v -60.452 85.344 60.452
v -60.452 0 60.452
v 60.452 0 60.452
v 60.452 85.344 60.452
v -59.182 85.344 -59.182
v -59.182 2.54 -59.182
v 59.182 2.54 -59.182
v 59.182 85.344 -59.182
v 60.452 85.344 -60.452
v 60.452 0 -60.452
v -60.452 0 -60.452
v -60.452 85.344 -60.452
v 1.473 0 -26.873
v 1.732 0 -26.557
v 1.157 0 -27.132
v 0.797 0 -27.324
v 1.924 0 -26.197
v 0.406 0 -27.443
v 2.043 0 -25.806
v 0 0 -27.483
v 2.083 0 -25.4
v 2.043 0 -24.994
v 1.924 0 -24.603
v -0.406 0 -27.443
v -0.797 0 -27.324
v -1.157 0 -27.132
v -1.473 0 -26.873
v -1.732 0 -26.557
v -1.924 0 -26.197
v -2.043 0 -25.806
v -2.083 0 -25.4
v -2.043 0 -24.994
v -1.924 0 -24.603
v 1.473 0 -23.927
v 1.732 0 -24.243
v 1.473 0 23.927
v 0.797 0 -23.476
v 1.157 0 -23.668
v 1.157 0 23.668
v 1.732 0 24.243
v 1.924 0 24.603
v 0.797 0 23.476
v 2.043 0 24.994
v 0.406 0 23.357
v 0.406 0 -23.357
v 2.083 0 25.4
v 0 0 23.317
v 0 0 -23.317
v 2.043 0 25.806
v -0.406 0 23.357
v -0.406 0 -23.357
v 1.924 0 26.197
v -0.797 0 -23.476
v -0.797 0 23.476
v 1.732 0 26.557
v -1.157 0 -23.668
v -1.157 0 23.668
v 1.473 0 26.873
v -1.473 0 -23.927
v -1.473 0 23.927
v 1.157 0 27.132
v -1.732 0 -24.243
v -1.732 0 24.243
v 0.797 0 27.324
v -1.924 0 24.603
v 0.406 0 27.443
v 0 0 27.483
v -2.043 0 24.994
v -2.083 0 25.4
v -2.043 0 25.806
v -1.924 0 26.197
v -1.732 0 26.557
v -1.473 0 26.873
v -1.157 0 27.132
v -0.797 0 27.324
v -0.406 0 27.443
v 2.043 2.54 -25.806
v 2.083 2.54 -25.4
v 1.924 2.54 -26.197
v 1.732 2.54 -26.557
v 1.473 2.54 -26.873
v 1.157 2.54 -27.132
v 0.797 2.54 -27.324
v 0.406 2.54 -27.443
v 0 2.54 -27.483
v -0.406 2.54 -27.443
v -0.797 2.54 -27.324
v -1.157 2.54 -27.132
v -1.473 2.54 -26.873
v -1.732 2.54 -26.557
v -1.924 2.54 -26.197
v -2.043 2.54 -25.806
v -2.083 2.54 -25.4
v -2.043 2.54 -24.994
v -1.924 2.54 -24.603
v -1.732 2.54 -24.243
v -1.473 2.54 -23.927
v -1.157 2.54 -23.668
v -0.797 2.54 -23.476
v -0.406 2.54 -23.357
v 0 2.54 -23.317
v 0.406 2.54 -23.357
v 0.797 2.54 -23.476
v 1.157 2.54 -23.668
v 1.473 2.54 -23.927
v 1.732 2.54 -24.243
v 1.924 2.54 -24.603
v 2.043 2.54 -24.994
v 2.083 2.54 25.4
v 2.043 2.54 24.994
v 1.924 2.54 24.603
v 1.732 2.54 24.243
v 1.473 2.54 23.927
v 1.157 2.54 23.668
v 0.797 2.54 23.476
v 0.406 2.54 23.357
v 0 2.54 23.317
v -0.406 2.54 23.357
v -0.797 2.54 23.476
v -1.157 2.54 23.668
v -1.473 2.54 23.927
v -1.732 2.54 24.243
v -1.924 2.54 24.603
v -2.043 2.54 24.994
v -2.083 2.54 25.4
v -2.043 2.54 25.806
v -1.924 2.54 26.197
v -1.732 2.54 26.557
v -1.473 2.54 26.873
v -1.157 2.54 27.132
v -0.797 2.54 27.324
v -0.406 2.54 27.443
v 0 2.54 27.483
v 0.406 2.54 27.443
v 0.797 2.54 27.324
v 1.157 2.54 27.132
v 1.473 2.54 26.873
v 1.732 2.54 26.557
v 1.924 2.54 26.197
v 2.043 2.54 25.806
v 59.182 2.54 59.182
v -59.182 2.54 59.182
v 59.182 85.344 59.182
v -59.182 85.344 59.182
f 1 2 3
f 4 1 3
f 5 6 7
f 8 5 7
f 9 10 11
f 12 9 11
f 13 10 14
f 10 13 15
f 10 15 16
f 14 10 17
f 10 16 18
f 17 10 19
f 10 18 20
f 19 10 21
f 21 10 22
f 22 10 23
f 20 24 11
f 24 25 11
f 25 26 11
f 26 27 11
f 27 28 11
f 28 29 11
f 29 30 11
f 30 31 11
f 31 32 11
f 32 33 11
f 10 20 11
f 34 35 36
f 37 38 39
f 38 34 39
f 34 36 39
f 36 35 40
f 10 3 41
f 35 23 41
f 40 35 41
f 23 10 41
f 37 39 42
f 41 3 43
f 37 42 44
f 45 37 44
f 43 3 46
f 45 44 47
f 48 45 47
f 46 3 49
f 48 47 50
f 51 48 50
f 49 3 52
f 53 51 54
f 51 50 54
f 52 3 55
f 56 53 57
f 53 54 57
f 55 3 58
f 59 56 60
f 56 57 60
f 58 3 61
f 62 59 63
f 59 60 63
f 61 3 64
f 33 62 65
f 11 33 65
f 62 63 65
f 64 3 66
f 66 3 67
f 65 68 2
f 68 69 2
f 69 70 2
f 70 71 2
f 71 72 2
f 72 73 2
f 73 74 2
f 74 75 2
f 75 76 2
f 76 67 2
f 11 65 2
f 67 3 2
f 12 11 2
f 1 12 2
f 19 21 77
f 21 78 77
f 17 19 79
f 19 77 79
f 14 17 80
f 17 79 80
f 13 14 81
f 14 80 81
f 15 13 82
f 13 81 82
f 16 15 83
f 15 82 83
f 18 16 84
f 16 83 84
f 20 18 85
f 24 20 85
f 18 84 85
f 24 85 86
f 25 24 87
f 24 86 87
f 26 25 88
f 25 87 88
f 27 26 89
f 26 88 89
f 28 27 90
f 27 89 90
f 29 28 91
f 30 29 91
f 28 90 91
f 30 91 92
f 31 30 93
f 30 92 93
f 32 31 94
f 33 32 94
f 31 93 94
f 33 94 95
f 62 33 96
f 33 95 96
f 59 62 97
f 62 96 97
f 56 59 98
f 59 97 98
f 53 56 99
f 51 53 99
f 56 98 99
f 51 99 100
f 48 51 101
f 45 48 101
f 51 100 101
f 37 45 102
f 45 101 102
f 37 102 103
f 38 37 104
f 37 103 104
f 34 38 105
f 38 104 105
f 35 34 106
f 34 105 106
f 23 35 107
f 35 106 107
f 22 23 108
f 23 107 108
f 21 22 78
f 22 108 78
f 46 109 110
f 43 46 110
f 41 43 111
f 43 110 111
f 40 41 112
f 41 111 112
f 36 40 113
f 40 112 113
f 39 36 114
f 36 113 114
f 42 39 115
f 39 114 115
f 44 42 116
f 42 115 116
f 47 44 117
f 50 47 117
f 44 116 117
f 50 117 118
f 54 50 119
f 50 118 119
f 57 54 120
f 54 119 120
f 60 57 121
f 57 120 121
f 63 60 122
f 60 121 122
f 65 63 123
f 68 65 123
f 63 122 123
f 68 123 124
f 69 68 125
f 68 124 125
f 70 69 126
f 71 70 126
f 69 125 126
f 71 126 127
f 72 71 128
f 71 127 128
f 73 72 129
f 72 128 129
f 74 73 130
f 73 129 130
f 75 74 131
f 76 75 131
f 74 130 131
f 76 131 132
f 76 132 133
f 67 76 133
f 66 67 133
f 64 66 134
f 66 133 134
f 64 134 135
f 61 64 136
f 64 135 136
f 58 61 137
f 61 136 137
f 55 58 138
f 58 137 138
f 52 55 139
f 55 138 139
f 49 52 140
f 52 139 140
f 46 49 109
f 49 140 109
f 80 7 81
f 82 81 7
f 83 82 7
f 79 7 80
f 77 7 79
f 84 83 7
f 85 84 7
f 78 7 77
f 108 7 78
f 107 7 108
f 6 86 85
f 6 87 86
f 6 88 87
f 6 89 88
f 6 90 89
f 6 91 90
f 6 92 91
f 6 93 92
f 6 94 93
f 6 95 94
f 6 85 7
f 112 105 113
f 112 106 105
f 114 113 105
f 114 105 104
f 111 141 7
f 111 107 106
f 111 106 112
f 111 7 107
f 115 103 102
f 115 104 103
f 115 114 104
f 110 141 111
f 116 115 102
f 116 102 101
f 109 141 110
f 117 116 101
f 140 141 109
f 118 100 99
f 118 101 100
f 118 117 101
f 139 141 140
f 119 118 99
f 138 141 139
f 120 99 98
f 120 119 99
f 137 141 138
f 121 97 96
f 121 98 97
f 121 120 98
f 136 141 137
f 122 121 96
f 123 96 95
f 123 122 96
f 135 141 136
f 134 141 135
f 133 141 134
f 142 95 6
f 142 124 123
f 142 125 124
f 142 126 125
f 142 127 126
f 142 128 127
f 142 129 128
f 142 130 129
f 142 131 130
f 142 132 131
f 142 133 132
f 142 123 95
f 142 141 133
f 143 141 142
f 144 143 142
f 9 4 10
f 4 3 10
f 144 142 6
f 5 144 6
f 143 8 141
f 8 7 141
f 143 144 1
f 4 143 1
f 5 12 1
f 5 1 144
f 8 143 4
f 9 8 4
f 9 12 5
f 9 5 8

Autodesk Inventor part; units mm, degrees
ref_plane "YZ Plane" through (0, 0, 0) normal (1, 0, 0) x (0, 1, 0)
ref_plane "XZ Plane" through (0, 0, 0) normal (0, 1, 0) x (-1, 0, 0)
ref_plane "XY Plane" through (0, 0, 0) normal (0, 0, 1) x (1, 0, 0)
sketch "Sketch1" plane through (0, 0, 0) normal (0, 1, 0) x (-1, 0, 0)
  line L0 (-60.452, -60.452) -> (60.452, -60.452)
  line L1 (60.452, -60.452) -> (60.452, 60.452)
  line L2 (60.452, 60.452) -> (-60.452, 60.452)
  line L3 (-60.452, 60.452) -> (-60.452, -60.452)
  line L4 (-60.452, -60.452) -> (60.452, 60.452) construction
  line L5 (60.452, -60.452) -> (-60.452, 60.452) construction
  point P0 (0, 0)
  dimension "d0" = 120.904
  dimension "d1" = 120.904
extrude "Extrusion1" add sketch "Sketch1" along normal blind 2.54
sketch "Sketch2" plane through (0, 2.54, 0) normal (0, 1, 0) x (1, 0, 0)
  line L0 (60.452, 60.452) -> (-60.452, 60.452) projected
  line L1 (60.452, -60.452) -> (-60.452, -60.452)
  line L2 (-60.452, -60.452) -> (-60.452, 60.452)
  line L3 (-60.452, 60.452) -> (60.452, 60.452)
  line L4 (60.452, 60.452) -> (60.452, -60.452)
  line L5 (60.452, -60.452) -> (-60.452, 60.452) construction
  line L6 (-60.452, -60.452) -> (60.452, 60.452) construction
  line L7 (59.182, -59.182) -> (-59.182, -59.182)
  line L8 (-59.182, -59.182) -> (-59.182, 59.182)
  line L9 (-59.182, 59.182) -> (59.182, 59.182)
  line L10 (59.182, 59.182) -> (59.182, -59.182)
  line L11 (59.182, -59.182) -> (-59.182, 59.182) construction
  line L12 (-59.182, -59.182) -> (59.182, 59.182) construction
  point P0 (0, 0)
  dimension "d4" = 118.364
  dimension "d5" = 118.364
extrude "Extrusion2" add sketch "Sketch2" along normal blind 82.804
sketch "Sketch3" plane through (0, 2.54, 0) normal (0, 1, 0) x (1, 0, 0)
  circle A0 centre (0, -25.4) radius 2.0828
  circle A1 centre (0, 25.4) radius 2.0828
  point P0 (0, 0)
  dimension "d10" = 4.1656
  dimension "d11" = 4.1656
extrude "Extrusion3" cut sketch "Sketch3" against normal through all
properties part number "546-1550Z137-4.8x4.8-Enclosure"
